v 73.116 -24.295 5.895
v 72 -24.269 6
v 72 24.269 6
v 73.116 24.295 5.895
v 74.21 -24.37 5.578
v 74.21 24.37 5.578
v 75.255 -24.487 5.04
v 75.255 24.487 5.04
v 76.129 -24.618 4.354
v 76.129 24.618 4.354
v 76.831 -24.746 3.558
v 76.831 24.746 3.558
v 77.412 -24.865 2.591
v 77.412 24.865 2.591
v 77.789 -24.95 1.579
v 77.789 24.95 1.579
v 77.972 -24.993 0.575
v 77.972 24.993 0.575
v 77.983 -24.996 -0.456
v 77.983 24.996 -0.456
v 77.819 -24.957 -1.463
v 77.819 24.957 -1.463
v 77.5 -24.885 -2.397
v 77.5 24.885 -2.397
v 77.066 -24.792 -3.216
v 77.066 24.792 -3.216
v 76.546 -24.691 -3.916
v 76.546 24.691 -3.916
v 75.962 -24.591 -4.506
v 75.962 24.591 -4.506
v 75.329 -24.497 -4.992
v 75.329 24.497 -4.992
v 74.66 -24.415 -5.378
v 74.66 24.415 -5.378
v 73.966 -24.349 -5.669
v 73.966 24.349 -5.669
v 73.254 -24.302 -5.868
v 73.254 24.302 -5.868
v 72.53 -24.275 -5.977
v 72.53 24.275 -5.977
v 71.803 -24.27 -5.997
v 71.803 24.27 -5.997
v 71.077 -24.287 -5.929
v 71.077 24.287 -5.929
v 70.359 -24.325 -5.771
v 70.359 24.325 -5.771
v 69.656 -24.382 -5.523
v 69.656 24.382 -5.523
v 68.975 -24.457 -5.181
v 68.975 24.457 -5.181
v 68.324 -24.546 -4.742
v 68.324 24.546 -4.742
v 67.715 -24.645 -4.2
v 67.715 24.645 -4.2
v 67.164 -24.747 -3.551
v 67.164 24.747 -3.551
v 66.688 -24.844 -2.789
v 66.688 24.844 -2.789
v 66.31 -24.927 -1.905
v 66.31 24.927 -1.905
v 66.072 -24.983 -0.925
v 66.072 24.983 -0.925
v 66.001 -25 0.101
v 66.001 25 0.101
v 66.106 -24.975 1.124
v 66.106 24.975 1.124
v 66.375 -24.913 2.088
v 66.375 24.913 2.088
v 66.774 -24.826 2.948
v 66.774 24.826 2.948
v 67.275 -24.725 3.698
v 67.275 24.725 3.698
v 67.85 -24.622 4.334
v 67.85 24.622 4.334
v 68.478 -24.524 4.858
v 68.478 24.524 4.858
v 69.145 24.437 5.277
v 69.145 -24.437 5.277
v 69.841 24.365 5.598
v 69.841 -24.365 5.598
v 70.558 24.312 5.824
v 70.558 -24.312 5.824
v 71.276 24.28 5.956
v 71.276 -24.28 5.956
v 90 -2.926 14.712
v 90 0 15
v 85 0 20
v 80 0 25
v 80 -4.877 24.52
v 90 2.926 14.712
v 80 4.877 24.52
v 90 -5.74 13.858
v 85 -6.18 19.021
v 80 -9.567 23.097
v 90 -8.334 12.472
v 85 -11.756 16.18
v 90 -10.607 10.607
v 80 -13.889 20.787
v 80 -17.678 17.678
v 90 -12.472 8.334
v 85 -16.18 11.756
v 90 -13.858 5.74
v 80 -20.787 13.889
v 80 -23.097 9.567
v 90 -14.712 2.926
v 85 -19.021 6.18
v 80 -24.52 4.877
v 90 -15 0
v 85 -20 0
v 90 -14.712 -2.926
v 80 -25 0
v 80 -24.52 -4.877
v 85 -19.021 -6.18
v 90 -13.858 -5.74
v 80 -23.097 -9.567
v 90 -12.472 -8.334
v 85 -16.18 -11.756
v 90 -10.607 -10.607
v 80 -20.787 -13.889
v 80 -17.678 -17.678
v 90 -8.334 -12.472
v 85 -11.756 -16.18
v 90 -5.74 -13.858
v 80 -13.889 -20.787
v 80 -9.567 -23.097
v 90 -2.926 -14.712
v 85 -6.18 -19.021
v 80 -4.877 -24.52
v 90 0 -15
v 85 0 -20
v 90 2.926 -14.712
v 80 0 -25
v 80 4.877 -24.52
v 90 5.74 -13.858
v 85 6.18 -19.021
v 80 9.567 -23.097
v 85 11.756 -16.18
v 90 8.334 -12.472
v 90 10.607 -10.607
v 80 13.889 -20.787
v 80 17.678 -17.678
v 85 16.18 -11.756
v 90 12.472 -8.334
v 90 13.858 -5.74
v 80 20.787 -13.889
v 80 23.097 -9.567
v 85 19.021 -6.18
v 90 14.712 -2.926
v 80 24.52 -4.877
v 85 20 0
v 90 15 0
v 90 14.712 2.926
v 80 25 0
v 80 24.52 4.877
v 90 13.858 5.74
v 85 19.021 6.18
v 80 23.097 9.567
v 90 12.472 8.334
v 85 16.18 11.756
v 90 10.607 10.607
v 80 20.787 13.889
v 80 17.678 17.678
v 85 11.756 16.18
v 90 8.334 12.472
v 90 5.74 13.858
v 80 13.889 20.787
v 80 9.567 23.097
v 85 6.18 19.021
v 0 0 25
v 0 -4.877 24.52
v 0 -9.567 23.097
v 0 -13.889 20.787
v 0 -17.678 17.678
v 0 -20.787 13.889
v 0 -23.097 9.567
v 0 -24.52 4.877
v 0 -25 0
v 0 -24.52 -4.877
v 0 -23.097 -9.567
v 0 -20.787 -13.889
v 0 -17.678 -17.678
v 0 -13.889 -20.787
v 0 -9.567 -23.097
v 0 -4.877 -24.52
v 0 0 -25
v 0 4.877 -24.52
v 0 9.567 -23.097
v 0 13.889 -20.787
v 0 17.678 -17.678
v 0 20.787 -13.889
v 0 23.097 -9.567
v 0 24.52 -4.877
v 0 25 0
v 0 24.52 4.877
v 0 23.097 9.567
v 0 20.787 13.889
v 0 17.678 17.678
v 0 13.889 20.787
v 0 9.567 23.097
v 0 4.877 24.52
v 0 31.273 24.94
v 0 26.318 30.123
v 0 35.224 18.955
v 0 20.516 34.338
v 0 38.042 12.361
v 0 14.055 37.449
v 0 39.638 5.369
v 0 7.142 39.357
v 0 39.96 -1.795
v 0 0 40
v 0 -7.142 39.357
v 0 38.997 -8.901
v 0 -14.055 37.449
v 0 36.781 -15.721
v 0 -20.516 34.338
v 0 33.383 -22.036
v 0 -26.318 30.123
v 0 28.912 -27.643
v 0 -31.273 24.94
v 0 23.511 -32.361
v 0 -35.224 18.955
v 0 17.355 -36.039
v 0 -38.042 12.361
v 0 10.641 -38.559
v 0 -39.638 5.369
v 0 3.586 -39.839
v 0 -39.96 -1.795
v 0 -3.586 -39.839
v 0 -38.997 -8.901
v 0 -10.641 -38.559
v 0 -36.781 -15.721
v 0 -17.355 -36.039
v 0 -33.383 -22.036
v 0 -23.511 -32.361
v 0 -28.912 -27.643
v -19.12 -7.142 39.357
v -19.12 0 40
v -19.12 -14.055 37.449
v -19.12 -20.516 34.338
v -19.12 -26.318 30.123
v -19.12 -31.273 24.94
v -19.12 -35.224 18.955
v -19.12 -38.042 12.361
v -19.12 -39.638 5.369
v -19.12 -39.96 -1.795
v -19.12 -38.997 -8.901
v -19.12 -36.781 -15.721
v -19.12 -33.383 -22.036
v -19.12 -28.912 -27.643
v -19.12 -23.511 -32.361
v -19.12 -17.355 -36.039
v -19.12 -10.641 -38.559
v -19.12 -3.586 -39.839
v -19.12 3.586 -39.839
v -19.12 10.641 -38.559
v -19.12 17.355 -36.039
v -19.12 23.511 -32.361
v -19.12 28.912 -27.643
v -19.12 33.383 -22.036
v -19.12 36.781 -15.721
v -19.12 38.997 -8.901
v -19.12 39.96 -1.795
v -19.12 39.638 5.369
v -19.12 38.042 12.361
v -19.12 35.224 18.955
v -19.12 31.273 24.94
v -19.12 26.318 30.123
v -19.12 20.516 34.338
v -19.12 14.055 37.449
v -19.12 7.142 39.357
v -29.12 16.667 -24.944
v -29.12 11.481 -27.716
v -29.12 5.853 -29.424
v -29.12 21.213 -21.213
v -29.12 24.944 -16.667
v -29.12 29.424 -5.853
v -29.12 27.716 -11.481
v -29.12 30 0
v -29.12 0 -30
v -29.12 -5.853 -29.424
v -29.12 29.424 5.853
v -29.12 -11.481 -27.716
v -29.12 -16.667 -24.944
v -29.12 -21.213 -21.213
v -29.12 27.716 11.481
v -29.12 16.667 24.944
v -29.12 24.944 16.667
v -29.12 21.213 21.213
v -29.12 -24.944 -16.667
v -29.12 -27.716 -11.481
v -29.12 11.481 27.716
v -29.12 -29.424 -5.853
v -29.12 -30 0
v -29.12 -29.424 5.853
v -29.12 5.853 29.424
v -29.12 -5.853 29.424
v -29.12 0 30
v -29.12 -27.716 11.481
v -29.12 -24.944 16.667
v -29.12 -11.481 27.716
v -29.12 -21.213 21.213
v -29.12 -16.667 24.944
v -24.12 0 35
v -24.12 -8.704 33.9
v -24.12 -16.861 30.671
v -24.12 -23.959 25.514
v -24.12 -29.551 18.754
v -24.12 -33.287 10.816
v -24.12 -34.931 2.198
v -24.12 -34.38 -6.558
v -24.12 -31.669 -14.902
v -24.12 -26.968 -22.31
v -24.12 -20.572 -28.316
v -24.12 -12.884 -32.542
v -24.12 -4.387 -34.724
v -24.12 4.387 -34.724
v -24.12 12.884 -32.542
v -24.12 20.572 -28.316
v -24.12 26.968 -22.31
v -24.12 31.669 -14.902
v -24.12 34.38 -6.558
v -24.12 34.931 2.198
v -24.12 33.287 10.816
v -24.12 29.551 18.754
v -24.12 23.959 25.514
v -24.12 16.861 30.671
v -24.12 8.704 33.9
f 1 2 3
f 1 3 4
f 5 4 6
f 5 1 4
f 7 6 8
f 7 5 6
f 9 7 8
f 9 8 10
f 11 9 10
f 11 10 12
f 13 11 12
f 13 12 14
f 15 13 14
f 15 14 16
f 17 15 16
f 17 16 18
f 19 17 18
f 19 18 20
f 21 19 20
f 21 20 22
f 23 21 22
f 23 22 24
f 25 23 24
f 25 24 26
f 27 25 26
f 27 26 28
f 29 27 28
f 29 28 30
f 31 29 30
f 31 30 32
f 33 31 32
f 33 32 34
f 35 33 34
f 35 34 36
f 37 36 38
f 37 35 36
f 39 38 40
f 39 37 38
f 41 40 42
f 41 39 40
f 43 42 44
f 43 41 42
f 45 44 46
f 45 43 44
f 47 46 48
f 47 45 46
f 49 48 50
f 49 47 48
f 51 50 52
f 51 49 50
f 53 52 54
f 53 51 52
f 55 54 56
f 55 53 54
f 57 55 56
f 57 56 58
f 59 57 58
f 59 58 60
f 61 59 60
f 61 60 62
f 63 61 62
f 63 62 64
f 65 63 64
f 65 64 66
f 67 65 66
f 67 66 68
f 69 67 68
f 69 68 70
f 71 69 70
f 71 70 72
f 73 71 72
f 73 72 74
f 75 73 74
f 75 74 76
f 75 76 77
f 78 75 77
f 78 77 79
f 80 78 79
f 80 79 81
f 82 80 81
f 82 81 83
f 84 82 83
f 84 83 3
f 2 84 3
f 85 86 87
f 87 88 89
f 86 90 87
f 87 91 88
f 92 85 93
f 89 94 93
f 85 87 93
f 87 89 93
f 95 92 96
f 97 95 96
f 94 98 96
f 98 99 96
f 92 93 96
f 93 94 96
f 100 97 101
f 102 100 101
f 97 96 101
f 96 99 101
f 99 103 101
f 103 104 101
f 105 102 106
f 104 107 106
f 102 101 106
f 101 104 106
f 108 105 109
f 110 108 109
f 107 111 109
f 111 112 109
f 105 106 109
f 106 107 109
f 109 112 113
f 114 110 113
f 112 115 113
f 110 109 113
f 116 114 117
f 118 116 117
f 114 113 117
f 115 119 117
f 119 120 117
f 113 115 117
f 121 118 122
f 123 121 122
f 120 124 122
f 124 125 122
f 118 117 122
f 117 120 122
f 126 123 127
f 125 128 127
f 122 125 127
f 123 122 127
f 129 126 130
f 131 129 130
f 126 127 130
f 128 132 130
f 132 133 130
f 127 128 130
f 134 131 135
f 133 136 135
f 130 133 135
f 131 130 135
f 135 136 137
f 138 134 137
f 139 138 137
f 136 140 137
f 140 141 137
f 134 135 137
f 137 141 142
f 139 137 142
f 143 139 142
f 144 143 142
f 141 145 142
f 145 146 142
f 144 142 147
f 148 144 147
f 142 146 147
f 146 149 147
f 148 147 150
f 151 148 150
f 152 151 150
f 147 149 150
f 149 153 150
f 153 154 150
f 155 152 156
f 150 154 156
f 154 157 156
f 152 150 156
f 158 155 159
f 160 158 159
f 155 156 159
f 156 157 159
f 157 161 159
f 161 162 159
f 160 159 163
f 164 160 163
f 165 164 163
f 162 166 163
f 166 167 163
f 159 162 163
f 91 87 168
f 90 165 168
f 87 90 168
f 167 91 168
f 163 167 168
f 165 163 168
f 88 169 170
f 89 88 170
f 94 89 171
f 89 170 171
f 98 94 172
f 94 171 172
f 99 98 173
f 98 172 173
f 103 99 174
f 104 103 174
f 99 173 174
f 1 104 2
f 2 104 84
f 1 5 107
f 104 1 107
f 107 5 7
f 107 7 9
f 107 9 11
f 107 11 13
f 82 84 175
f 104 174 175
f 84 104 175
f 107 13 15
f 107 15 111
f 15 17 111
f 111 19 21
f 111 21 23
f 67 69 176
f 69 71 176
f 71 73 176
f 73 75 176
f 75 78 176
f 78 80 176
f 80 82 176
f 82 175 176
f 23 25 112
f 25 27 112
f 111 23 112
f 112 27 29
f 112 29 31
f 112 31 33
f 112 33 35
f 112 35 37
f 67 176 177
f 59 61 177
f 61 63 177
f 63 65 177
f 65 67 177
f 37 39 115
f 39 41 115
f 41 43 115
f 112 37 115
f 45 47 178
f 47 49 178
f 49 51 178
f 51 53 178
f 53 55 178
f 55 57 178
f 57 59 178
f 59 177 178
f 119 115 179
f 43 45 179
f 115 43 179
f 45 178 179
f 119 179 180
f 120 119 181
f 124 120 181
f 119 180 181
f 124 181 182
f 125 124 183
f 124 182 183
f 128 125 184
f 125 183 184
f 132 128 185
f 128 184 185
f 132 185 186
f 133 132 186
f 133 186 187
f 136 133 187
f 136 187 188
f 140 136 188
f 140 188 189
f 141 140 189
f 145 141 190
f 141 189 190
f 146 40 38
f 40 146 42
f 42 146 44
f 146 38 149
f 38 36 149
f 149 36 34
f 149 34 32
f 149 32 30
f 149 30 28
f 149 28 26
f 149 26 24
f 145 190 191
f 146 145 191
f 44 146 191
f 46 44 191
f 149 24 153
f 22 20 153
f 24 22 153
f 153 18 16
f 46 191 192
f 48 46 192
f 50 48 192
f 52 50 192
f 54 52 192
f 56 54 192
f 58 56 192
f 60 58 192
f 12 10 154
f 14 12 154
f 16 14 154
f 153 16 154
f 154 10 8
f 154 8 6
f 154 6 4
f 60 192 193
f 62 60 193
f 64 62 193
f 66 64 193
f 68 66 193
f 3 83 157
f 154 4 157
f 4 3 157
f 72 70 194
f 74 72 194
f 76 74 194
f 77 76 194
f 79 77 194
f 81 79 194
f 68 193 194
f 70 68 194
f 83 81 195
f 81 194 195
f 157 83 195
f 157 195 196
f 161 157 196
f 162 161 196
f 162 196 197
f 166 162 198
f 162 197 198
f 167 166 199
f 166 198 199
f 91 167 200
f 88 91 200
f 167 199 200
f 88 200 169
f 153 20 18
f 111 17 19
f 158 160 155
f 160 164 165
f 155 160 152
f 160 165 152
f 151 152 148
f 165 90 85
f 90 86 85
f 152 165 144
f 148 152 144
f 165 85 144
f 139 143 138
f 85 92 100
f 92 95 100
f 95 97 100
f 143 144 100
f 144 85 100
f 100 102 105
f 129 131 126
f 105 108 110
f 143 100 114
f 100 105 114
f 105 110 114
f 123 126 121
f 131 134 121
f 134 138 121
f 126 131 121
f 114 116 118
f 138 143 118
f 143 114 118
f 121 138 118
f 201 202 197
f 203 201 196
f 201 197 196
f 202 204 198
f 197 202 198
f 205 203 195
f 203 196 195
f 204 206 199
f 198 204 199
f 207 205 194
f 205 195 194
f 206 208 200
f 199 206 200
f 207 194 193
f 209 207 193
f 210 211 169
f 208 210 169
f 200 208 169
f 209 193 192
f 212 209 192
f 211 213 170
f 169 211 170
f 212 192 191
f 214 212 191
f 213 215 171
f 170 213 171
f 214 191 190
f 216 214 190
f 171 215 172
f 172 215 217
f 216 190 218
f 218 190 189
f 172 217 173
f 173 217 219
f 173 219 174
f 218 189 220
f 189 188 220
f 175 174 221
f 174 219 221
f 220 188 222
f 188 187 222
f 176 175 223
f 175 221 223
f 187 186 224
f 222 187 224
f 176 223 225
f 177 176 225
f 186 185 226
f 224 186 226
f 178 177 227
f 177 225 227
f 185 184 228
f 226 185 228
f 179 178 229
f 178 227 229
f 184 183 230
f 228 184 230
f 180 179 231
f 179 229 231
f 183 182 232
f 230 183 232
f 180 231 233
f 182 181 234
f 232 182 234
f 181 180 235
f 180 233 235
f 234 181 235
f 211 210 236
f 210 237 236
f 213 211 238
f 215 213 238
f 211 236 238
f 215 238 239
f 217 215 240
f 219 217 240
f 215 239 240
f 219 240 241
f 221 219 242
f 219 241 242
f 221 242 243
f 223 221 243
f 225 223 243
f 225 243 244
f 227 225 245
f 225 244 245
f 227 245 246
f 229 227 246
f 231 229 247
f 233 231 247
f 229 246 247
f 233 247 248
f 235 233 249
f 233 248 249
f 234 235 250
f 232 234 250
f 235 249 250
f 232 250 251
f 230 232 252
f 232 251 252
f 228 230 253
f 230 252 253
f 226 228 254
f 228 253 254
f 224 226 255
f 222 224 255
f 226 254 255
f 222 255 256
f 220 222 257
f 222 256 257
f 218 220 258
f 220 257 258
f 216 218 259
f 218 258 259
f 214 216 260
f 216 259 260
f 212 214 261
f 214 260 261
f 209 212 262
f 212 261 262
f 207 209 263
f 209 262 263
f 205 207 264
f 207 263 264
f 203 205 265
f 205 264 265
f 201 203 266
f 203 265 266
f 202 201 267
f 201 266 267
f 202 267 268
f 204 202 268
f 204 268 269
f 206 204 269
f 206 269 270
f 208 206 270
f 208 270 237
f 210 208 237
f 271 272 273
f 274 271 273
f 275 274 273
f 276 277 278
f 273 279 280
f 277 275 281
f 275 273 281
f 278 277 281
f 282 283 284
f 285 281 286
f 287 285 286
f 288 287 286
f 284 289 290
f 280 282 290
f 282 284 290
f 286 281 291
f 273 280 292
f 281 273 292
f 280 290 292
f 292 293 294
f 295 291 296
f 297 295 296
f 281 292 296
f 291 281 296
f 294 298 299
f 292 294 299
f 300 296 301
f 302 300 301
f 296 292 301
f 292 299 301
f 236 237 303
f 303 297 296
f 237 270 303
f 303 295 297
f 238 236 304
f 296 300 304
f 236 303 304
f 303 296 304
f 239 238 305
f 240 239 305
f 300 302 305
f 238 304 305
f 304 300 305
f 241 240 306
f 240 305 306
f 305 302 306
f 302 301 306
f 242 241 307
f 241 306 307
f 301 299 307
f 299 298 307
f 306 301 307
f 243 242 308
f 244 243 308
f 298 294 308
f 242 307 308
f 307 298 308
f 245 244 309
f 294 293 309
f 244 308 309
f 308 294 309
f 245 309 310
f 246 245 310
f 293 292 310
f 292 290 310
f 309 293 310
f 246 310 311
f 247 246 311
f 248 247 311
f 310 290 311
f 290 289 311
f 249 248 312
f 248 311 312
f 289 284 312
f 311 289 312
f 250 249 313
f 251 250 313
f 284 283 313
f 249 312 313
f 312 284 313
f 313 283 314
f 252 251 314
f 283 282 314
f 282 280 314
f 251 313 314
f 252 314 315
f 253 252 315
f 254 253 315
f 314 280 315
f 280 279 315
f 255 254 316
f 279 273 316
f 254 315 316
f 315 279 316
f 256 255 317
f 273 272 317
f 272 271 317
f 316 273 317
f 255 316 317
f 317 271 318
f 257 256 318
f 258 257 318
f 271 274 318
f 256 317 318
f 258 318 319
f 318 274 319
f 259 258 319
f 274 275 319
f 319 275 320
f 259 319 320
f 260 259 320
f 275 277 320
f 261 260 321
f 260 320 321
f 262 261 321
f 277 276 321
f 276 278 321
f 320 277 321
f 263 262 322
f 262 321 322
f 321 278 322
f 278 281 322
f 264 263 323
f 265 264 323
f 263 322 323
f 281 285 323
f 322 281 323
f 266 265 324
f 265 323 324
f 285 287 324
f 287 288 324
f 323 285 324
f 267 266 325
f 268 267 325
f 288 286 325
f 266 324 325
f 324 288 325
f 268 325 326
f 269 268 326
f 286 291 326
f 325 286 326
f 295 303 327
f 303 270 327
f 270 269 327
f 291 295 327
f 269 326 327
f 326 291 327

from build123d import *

# Parameters (mm, degrees)
CUT_EXTRUDE3_DEPTH      = 107.301458127
CUT_EXTRUDE3_DEPTH_BACK = 107.301458127
SKETCH4_R               = 6


with BuildPart() as part:
    # Sketch1 → Revolve2 (revolve)
    with BuildSketch(Plane(origin=(0, 0, 0), x_dir=(1, 0, 0), z_dir=(0, 1, 0)), mode=Mode.PRIVATE) as revolve2_sk:
        Polygon((0, 25), (0, 40), (-19.12049302, 40), (-29.12049302, 30), (-29.12049302, 0), (0, 0), (90, 0), (90, 15), (80, 25), align=None)
    revolve(revolve2_sk.sketch.rotate(Axis((0, 0, 0), (1, 0, 0)), 180), axis=Axis((0, 0, 0), (1, 0, 0)))

    # Sketch4 → Cut-Extrude3 (cut, two sides: drawn at the far end of the back side and taken through both)
    with BuildSketch(Plane(origin=(0, 0, 0), x_dir=(1, 0, 0), z_dir=(0, 1, 0)).offset(-CUT_EXTRUDE3_DEPTH_BACK)):
        with Locations(Location((72, 0, 0), (0, 0, 270))):
            Circle(SKETCH4_R)
    extrude(amount=CUT_EXTRUDE3_DEPTH + CUT_EXTRUDE3_DEPTH_BACK, mode=Mode.SUBTRACT)


solid = part.part
